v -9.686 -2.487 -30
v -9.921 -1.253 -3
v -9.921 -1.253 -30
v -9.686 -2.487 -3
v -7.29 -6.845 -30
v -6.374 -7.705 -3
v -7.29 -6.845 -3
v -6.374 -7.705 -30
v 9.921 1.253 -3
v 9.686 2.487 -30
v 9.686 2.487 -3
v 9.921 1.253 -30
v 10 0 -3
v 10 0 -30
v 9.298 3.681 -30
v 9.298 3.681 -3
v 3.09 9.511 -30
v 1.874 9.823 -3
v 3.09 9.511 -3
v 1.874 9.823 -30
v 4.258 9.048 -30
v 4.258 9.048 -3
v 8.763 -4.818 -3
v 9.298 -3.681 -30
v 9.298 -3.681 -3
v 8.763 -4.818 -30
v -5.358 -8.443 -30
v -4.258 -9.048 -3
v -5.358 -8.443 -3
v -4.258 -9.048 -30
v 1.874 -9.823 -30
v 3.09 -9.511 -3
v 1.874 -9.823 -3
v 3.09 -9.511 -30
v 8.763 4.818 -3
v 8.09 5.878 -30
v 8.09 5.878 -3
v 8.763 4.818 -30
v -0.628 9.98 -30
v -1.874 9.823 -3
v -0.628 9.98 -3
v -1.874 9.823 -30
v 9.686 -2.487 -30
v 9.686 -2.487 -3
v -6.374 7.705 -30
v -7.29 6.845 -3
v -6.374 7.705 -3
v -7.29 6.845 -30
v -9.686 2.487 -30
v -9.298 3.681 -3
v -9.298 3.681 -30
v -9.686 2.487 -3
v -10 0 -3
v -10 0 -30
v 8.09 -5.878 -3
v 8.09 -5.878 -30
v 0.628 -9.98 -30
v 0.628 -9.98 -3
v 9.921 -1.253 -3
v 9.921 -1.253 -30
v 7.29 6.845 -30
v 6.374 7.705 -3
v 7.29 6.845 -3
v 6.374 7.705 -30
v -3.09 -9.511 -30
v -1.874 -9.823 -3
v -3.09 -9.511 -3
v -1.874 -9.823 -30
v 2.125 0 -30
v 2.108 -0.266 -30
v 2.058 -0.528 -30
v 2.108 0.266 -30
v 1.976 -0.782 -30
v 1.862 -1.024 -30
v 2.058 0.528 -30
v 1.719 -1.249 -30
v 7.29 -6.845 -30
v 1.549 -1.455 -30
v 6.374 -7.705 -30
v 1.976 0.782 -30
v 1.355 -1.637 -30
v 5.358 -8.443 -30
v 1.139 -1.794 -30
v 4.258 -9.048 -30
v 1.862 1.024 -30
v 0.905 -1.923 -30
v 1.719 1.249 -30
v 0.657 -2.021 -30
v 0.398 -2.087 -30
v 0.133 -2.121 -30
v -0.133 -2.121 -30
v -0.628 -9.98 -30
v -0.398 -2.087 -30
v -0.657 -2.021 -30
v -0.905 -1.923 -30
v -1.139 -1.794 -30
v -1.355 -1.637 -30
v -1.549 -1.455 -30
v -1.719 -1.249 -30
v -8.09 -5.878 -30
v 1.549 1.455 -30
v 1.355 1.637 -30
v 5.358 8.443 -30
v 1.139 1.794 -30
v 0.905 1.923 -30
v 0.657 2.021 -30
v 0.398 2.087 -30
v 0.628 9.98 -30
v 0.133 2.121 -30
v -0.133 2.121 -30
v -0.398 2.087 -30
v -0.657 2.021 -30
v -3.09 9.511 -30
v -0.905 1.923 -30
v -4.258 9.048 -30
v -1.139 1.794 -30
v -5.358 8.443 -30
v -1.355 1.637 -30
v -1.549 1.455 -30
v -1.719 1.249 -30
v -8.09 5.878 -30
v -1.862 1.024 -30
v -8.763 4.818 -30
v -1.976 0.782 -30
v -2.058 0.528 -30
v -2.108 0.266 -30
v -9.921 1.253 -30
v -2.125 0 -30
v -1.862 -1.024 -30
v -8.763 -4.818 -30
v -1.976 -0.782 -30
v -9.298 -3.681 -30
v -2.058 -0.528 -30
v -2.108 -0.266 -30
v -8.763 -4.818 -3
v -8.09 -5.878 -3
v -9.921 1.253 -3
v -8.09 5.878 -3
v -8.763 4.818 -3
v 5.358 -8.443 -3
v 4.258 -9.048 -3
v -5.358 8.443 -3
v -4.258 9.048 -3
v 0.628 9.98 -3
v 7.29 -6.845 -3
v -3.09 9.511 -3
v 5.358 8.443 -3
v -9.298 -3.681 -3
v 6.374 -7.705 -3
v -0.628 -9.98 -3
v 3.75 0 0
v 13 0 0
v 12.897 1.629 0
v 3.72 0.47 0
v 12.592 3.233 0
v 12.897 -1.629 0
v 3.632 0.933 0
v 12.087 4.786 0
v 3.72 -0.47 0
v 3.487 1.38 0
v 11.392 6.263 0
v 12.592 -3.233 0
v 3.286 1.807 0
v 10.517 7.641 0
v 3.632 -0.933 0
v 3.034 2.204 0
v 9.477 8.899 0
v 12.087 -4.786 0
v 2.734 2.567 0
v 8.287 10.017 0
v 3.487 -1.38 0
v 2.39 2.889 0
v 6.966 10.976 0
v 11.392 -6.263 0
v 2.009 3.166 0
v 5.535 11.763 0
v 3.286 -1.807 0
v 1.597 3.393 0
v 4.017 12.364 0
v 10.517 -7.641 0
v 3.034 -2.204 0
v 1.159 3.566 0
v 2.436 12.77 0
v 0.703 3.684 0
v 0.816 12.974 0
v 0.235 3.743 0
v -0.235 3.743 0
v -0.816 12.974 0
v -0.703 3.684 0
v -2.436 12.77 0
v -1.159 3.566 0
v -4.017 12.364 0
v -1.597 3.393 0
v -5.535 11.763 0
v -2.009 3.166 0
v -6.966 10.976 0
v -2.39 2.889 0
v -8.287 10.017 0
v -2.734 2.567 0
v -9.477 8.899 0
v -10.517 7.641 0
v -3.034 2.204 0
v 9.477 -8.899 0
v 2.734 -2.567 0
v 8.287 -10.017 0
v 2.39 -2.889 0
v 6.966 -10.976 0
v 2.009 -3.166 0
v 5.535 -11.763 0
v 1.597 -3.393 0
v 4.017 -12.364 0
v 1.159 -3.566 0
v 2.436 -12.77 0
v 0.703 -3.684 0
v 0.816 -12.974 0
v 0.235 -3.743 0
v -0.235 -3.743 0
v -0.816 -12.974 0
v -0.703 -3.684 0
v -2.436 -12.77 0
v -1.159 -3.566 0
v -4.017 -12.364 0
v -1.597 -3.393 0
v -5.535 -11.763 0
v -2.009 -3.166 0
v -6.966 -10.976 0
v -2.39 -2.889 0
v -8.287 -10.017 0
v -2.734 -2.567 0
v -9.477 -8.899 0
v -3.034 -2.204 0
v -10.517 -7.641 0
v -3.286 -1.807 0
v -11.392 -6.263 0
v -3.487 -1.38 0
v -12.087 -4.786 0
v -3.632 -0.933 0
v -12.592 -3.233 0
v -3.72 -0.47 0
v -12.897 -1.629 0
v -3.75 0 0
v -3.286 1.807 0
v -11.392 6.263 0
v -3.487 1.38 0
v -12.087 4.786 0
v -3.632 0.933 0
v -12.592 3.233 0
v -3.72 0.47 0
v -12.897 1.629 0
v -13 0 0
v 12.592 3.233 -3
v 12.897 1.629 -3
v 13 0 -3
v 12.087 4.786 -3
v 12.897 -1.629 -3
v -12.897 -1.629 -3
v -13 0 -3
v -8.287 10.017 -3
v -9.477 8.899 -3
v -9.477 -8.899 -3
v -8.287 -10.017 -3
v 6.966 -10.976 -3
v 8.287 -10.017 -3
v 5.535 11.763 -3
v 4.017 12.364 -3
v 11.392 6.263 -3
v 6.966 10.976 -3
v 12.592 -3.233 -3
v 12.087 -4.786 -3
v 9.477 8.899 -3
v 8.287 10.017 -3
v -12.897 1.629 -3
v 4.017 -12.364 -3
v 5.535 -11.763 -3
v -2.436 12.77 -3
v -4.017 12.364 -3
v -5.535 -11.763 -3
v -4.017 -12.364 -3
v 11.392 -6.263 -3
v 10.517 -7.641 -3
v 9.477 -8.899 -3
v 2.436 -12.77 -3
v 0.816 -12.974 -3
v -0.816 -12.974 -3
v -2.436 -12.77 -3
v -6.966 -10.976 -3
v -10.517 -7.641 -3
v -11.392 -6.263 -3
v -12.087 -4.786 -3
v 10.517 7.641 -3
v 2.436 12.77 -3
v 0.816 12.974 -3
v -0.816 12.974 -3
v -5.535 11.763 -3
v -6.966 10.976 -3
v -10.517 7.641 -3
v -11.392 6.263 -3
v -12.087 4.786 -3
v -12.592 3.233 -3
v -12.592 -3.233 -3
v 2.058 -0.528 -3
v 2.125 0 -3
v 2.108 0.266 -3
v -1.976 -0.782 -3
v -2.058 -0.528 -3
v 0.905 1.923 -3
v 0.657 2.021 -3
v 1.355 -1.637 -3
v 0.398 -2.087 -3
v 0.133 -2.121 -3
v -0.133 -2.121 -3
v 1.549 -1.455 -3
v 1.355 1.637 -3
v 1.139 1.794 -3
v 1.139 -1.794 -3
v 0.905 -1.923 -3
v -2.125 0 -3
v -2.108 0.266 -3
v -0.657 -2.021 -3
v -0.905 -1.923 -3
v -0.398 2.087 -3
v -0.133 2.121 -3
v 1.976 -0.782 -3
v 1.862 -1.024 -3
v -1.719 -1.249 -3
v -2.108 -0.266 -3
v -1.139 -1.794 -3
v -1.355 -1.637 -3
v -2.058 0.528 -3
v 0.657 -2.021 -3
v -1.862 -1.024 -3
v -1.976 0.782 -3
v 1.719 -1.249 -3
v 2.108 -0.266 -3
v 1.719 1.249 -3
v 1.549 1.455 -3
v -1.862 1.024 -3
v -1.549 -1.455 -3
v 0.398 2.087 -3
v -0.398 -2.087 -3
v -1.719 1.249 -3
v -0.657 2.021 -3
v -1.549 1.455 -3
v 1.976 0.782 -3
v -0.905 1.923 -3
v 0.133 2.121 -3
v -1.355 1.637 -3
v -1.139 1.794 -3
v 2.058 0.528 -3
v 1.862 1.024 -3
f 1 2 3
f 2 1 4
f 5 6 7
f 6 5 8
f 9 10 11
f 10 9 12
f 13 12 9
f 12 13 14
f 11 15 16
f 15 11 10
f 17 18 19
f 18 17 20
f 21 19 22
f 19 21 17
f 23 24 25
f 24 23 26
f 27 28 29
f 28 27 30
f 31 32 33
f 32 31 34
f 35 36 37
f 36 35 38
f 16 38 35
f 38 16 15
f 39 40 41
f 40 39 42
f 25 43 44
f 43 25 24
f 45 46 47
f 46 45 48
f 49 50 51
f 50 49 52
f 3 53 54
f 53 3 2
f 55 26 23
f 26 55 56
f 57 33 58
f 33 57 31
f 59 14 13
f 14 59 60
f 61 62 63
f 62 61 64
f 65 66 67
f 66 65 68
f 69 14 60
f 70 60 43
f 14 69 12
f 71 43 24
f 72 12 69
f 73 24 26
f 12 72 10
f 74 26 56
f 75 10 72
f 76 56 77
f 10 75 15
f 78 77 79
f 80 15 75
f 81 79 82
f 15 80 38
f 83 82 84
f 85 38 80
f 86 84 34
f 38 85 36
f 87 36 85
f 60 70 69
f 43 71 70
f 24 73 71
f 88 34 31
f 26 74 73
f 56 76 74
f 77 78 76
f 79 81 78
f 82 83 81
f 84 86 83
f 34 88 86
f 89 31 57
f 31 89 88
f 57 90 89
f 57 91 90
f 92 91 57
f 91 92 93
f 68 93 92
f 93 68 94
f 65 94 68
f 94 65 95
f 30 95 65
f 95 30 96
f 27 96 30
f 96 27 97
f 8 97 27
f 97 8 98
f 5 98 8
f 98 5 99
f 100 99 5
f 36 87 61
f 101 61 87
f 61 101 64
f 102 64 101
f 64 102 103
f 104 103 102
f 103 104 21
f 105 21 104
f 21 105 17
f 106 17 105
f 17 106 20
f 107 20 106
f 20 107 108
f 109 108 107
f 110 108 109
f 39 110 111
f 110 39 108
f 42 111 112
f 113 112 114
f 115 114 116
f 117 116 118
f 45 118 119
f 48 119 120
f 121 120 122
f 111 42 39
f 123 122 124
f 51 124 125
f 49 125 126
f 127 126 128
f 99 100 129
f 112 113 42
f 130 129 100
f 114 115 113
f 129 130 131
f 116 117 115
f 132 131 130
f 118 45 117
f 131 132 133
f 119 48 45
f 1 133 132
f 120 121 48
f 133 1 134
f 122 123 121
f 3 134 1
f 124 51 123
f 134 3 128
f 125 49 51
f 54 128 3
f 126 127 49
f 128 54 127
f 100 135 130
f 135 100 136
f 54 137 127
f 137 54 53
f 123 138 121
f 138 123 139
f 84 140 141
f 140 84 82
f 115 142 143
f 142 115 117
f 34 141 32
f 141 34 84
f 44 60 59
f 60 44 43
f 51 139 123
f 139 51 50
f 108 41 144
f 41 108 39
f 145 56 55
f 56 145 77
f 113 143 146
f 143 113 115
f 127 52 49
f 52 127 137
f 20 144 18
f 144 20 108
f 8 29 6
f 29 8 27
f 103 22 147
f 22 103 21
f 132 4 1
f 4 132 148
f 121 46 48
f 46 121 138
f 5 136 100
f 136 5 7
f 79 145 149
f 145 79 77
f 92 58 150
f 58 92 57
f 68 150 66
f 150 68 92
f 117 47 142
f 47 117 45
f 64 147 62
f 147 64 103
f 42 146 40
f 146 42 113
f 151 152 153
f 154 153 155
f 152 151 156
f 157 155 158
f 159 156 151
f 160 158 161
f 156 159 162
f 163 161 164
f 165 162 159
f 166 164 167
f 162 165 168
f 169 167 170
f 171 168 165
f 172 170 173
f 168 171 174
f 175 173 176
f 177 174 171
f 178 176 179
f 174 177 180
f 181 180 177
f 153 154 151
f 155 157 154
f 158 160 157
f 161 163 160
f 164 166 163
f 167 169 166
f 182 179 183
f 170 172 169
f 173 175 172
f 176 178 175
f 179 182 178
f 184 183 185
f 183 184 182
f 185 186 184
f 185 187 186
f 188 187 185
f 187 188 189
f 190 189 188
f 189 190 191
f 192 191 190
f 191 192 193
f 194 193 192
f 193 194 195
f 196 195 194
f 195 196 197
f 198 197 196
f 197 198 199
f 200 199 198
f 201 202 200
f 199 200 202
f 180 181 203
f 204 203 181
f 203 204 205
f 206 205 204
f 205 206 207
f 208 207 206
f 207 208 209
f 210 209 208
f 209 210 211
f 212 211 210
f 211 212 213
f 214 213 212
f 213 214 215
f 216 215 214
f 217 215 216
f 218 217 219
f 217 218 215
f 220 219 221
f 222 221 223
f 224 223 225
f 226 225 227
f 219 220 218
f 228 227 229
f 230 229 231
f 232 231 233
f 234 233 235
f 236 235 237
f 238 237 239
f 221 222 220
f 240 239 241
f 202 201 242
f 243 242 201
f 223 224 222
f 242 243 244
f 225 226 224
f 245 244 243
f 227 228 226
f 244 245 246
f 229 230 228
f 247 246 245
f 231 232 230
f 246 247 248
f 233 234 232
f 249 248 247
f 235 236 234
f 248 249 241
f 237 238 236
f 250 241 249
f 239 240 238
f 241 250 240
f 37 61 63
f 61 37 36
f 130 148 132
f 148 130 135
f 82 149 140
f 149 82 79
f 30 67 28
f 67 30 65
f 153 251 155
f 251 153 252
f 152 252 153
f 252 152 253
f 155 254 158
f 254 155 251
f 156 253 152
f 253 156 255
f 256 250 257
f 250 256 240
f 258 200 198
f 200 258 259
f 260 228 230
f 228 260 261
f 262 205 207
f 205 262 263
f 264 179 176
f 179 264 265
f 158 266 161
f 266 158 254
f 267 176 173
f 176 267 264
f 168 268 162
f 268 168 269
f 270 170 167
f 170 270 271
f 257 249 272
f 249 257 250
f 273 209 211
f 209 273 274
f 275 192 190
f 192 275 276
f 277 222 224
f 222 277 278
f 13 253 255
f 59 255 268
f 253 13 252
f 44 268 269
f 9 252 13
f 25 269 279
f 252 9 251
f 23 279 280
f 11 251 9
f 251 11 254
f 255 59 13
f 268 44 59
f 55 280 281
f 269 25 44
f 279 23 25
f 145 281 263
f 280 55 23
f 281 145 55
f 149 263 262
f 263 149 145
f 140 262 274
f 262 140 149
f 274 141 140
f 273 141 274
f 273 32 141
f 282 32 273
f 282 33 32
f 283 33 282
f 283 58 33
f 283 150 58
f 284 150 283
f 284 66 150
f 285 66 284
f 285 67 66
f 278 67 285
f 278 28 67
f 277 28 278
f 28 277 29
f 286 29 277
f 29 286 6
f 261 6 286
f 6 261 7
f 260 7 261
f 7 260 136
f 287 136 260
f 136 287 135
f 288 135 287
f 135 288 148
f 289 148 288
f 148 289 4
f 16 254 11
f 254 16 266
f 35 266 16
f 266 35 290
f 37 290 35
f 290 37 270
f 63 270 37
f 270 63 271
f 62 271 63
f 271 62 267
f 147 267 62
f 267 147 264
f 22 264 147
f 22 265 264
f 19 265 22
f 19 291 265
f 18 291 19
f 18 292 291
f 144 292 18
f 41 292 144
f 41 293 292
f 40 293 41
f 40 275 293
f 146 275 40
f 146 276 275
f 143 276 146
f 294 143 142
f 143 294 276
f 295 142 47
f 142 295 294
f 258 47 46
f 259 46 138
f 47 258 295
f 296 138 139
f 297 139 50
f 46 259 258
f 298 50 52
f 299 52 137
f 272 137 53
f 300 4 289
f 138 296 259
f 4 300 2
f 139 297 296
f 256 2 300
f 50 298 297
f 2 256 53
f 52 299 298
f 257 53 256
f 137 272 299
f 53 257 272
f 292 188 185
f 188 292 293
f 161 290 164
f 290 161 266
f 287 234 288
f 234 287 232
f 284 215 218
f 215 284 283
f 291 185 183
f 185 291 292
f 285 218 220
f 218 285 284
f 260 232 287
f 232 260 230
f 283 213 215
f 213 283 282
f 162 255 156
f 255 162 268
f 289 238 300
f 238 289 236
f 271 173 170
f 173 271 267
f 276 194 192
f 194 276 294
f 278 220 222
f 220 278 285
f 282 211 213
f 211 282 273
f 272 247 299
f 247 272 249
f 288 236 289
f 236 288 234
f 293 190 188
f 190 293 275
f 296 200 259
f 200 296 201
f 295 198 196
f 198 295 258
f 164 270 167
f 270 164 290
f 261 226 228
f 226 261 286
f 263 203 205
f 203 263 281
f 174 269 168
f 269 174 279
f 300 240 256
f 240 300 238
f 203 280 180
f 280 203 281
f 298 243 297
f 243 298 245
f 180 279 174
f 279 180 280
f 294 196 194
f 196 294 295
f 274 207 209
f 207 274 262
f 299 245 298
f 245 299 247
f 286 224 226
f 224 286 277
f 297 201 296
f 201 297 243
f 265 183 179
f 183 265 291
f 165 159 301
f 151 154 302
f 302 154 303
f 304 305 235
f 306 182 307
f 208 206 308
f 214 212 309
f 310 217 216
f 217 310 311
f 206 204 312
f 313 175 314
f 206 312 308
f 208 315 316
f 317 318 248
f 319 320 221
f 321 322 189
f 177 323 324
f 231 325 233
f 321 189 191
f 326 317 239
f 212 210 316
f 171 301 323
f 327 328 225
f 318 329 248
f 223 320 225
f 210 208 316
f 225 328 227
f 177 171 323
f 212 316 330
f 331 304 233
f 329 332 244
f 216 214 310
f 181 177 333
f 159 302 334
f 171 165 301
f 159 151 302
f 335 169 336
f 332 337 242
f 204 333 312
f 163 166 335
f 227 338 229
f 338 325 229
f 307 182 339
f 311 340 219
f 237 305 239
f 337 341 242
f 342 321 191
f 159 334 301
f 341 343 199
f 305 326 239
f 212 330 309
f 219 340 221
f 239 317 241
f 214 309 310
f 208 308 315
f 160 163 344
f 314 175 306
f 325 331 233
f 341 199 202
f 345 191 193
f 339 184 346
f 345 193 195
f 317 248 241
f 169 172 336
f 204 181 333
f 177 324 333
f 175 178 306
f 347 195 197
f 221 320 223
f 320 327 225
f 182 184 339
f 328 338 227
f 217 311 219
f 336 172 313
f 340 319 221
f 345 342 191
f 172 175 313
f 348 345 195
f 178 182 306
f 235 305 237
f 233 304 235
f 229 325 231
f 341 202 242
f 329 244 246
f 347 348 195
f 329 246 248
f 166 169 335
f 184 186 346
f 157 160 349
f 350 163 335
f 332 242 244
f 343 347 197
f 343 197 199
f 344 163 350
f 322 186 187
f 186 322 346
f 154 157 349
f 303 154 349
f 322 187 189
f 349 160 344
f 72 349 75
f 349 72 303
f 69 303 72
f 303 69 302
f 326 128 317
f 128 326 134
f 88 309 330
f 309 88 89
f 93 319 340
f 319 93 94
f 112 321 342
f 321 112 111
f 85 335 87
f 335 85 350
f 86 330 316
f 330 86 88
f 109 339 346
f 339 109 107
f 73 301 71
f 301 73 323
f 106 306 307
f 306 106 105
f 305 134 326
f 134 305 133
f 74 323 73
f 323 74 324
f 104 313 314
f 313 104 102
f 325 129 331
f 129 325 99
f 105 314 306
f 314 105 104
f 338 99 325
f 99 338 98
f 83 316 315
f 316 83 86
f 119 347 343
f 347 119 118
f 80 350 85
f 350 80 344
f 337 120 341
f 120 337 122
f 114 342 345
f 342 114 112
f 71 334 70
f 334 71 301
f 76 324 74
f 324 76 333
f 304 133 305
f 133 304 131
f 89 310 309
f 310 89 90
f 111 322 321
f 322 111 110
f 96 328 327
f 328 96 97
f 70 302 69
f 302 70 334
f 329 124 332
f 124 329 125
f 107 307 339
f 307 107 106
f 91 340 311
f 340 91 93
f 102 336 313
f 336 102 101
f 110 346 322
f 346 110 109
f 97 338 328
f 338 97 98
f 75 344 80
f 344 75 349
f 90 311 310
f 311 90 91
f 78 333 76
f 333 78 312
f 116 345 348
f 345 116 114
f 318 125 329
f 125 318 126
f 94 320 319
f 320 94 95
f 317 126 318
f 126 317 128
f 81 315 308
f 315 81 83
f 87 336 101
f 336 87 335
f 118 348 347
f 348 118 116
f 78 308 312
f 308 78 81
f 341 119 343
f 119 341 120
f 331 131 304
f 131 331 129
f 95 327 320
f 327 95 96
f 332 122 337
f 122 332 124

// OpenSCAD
$fn = 50;


difference() {
	union() {
		translate(v = [0, 0, -30.0000000000]) {
			cylinder(h = 30, r = 10.0000000000);
		}
		translate(v = [0, 0, -3.0000000000]) {
			cylinder(h = 3, r = 13.0000000000);
		}
	}
	union() {
		translate(v = [0, 0, 0]) {
			rotate(a = [0, 0, 0]) {
				difference() {
					union() {
						#translate(v = [0, 0, -30.0000000000]) {
							cylinder(h = 30, r = 2.0000000000);
						}
						#translate(v = [0, 0, -3]) {
							cylinder(h = 3, r1 = 2.1250000000, r2 = 3.7500000000);
						}
						#translate(v = [0, 0, -30.0000000000]) {
							cylinder(h = 30, r = 2.1250000000);
						}
						#translate(v = [0, 0, -30.0000000000]) {
							cylinder(h = 30, r = 2.0000000000);
						}
					}
					union();
				}
			}
		}
	}
}
